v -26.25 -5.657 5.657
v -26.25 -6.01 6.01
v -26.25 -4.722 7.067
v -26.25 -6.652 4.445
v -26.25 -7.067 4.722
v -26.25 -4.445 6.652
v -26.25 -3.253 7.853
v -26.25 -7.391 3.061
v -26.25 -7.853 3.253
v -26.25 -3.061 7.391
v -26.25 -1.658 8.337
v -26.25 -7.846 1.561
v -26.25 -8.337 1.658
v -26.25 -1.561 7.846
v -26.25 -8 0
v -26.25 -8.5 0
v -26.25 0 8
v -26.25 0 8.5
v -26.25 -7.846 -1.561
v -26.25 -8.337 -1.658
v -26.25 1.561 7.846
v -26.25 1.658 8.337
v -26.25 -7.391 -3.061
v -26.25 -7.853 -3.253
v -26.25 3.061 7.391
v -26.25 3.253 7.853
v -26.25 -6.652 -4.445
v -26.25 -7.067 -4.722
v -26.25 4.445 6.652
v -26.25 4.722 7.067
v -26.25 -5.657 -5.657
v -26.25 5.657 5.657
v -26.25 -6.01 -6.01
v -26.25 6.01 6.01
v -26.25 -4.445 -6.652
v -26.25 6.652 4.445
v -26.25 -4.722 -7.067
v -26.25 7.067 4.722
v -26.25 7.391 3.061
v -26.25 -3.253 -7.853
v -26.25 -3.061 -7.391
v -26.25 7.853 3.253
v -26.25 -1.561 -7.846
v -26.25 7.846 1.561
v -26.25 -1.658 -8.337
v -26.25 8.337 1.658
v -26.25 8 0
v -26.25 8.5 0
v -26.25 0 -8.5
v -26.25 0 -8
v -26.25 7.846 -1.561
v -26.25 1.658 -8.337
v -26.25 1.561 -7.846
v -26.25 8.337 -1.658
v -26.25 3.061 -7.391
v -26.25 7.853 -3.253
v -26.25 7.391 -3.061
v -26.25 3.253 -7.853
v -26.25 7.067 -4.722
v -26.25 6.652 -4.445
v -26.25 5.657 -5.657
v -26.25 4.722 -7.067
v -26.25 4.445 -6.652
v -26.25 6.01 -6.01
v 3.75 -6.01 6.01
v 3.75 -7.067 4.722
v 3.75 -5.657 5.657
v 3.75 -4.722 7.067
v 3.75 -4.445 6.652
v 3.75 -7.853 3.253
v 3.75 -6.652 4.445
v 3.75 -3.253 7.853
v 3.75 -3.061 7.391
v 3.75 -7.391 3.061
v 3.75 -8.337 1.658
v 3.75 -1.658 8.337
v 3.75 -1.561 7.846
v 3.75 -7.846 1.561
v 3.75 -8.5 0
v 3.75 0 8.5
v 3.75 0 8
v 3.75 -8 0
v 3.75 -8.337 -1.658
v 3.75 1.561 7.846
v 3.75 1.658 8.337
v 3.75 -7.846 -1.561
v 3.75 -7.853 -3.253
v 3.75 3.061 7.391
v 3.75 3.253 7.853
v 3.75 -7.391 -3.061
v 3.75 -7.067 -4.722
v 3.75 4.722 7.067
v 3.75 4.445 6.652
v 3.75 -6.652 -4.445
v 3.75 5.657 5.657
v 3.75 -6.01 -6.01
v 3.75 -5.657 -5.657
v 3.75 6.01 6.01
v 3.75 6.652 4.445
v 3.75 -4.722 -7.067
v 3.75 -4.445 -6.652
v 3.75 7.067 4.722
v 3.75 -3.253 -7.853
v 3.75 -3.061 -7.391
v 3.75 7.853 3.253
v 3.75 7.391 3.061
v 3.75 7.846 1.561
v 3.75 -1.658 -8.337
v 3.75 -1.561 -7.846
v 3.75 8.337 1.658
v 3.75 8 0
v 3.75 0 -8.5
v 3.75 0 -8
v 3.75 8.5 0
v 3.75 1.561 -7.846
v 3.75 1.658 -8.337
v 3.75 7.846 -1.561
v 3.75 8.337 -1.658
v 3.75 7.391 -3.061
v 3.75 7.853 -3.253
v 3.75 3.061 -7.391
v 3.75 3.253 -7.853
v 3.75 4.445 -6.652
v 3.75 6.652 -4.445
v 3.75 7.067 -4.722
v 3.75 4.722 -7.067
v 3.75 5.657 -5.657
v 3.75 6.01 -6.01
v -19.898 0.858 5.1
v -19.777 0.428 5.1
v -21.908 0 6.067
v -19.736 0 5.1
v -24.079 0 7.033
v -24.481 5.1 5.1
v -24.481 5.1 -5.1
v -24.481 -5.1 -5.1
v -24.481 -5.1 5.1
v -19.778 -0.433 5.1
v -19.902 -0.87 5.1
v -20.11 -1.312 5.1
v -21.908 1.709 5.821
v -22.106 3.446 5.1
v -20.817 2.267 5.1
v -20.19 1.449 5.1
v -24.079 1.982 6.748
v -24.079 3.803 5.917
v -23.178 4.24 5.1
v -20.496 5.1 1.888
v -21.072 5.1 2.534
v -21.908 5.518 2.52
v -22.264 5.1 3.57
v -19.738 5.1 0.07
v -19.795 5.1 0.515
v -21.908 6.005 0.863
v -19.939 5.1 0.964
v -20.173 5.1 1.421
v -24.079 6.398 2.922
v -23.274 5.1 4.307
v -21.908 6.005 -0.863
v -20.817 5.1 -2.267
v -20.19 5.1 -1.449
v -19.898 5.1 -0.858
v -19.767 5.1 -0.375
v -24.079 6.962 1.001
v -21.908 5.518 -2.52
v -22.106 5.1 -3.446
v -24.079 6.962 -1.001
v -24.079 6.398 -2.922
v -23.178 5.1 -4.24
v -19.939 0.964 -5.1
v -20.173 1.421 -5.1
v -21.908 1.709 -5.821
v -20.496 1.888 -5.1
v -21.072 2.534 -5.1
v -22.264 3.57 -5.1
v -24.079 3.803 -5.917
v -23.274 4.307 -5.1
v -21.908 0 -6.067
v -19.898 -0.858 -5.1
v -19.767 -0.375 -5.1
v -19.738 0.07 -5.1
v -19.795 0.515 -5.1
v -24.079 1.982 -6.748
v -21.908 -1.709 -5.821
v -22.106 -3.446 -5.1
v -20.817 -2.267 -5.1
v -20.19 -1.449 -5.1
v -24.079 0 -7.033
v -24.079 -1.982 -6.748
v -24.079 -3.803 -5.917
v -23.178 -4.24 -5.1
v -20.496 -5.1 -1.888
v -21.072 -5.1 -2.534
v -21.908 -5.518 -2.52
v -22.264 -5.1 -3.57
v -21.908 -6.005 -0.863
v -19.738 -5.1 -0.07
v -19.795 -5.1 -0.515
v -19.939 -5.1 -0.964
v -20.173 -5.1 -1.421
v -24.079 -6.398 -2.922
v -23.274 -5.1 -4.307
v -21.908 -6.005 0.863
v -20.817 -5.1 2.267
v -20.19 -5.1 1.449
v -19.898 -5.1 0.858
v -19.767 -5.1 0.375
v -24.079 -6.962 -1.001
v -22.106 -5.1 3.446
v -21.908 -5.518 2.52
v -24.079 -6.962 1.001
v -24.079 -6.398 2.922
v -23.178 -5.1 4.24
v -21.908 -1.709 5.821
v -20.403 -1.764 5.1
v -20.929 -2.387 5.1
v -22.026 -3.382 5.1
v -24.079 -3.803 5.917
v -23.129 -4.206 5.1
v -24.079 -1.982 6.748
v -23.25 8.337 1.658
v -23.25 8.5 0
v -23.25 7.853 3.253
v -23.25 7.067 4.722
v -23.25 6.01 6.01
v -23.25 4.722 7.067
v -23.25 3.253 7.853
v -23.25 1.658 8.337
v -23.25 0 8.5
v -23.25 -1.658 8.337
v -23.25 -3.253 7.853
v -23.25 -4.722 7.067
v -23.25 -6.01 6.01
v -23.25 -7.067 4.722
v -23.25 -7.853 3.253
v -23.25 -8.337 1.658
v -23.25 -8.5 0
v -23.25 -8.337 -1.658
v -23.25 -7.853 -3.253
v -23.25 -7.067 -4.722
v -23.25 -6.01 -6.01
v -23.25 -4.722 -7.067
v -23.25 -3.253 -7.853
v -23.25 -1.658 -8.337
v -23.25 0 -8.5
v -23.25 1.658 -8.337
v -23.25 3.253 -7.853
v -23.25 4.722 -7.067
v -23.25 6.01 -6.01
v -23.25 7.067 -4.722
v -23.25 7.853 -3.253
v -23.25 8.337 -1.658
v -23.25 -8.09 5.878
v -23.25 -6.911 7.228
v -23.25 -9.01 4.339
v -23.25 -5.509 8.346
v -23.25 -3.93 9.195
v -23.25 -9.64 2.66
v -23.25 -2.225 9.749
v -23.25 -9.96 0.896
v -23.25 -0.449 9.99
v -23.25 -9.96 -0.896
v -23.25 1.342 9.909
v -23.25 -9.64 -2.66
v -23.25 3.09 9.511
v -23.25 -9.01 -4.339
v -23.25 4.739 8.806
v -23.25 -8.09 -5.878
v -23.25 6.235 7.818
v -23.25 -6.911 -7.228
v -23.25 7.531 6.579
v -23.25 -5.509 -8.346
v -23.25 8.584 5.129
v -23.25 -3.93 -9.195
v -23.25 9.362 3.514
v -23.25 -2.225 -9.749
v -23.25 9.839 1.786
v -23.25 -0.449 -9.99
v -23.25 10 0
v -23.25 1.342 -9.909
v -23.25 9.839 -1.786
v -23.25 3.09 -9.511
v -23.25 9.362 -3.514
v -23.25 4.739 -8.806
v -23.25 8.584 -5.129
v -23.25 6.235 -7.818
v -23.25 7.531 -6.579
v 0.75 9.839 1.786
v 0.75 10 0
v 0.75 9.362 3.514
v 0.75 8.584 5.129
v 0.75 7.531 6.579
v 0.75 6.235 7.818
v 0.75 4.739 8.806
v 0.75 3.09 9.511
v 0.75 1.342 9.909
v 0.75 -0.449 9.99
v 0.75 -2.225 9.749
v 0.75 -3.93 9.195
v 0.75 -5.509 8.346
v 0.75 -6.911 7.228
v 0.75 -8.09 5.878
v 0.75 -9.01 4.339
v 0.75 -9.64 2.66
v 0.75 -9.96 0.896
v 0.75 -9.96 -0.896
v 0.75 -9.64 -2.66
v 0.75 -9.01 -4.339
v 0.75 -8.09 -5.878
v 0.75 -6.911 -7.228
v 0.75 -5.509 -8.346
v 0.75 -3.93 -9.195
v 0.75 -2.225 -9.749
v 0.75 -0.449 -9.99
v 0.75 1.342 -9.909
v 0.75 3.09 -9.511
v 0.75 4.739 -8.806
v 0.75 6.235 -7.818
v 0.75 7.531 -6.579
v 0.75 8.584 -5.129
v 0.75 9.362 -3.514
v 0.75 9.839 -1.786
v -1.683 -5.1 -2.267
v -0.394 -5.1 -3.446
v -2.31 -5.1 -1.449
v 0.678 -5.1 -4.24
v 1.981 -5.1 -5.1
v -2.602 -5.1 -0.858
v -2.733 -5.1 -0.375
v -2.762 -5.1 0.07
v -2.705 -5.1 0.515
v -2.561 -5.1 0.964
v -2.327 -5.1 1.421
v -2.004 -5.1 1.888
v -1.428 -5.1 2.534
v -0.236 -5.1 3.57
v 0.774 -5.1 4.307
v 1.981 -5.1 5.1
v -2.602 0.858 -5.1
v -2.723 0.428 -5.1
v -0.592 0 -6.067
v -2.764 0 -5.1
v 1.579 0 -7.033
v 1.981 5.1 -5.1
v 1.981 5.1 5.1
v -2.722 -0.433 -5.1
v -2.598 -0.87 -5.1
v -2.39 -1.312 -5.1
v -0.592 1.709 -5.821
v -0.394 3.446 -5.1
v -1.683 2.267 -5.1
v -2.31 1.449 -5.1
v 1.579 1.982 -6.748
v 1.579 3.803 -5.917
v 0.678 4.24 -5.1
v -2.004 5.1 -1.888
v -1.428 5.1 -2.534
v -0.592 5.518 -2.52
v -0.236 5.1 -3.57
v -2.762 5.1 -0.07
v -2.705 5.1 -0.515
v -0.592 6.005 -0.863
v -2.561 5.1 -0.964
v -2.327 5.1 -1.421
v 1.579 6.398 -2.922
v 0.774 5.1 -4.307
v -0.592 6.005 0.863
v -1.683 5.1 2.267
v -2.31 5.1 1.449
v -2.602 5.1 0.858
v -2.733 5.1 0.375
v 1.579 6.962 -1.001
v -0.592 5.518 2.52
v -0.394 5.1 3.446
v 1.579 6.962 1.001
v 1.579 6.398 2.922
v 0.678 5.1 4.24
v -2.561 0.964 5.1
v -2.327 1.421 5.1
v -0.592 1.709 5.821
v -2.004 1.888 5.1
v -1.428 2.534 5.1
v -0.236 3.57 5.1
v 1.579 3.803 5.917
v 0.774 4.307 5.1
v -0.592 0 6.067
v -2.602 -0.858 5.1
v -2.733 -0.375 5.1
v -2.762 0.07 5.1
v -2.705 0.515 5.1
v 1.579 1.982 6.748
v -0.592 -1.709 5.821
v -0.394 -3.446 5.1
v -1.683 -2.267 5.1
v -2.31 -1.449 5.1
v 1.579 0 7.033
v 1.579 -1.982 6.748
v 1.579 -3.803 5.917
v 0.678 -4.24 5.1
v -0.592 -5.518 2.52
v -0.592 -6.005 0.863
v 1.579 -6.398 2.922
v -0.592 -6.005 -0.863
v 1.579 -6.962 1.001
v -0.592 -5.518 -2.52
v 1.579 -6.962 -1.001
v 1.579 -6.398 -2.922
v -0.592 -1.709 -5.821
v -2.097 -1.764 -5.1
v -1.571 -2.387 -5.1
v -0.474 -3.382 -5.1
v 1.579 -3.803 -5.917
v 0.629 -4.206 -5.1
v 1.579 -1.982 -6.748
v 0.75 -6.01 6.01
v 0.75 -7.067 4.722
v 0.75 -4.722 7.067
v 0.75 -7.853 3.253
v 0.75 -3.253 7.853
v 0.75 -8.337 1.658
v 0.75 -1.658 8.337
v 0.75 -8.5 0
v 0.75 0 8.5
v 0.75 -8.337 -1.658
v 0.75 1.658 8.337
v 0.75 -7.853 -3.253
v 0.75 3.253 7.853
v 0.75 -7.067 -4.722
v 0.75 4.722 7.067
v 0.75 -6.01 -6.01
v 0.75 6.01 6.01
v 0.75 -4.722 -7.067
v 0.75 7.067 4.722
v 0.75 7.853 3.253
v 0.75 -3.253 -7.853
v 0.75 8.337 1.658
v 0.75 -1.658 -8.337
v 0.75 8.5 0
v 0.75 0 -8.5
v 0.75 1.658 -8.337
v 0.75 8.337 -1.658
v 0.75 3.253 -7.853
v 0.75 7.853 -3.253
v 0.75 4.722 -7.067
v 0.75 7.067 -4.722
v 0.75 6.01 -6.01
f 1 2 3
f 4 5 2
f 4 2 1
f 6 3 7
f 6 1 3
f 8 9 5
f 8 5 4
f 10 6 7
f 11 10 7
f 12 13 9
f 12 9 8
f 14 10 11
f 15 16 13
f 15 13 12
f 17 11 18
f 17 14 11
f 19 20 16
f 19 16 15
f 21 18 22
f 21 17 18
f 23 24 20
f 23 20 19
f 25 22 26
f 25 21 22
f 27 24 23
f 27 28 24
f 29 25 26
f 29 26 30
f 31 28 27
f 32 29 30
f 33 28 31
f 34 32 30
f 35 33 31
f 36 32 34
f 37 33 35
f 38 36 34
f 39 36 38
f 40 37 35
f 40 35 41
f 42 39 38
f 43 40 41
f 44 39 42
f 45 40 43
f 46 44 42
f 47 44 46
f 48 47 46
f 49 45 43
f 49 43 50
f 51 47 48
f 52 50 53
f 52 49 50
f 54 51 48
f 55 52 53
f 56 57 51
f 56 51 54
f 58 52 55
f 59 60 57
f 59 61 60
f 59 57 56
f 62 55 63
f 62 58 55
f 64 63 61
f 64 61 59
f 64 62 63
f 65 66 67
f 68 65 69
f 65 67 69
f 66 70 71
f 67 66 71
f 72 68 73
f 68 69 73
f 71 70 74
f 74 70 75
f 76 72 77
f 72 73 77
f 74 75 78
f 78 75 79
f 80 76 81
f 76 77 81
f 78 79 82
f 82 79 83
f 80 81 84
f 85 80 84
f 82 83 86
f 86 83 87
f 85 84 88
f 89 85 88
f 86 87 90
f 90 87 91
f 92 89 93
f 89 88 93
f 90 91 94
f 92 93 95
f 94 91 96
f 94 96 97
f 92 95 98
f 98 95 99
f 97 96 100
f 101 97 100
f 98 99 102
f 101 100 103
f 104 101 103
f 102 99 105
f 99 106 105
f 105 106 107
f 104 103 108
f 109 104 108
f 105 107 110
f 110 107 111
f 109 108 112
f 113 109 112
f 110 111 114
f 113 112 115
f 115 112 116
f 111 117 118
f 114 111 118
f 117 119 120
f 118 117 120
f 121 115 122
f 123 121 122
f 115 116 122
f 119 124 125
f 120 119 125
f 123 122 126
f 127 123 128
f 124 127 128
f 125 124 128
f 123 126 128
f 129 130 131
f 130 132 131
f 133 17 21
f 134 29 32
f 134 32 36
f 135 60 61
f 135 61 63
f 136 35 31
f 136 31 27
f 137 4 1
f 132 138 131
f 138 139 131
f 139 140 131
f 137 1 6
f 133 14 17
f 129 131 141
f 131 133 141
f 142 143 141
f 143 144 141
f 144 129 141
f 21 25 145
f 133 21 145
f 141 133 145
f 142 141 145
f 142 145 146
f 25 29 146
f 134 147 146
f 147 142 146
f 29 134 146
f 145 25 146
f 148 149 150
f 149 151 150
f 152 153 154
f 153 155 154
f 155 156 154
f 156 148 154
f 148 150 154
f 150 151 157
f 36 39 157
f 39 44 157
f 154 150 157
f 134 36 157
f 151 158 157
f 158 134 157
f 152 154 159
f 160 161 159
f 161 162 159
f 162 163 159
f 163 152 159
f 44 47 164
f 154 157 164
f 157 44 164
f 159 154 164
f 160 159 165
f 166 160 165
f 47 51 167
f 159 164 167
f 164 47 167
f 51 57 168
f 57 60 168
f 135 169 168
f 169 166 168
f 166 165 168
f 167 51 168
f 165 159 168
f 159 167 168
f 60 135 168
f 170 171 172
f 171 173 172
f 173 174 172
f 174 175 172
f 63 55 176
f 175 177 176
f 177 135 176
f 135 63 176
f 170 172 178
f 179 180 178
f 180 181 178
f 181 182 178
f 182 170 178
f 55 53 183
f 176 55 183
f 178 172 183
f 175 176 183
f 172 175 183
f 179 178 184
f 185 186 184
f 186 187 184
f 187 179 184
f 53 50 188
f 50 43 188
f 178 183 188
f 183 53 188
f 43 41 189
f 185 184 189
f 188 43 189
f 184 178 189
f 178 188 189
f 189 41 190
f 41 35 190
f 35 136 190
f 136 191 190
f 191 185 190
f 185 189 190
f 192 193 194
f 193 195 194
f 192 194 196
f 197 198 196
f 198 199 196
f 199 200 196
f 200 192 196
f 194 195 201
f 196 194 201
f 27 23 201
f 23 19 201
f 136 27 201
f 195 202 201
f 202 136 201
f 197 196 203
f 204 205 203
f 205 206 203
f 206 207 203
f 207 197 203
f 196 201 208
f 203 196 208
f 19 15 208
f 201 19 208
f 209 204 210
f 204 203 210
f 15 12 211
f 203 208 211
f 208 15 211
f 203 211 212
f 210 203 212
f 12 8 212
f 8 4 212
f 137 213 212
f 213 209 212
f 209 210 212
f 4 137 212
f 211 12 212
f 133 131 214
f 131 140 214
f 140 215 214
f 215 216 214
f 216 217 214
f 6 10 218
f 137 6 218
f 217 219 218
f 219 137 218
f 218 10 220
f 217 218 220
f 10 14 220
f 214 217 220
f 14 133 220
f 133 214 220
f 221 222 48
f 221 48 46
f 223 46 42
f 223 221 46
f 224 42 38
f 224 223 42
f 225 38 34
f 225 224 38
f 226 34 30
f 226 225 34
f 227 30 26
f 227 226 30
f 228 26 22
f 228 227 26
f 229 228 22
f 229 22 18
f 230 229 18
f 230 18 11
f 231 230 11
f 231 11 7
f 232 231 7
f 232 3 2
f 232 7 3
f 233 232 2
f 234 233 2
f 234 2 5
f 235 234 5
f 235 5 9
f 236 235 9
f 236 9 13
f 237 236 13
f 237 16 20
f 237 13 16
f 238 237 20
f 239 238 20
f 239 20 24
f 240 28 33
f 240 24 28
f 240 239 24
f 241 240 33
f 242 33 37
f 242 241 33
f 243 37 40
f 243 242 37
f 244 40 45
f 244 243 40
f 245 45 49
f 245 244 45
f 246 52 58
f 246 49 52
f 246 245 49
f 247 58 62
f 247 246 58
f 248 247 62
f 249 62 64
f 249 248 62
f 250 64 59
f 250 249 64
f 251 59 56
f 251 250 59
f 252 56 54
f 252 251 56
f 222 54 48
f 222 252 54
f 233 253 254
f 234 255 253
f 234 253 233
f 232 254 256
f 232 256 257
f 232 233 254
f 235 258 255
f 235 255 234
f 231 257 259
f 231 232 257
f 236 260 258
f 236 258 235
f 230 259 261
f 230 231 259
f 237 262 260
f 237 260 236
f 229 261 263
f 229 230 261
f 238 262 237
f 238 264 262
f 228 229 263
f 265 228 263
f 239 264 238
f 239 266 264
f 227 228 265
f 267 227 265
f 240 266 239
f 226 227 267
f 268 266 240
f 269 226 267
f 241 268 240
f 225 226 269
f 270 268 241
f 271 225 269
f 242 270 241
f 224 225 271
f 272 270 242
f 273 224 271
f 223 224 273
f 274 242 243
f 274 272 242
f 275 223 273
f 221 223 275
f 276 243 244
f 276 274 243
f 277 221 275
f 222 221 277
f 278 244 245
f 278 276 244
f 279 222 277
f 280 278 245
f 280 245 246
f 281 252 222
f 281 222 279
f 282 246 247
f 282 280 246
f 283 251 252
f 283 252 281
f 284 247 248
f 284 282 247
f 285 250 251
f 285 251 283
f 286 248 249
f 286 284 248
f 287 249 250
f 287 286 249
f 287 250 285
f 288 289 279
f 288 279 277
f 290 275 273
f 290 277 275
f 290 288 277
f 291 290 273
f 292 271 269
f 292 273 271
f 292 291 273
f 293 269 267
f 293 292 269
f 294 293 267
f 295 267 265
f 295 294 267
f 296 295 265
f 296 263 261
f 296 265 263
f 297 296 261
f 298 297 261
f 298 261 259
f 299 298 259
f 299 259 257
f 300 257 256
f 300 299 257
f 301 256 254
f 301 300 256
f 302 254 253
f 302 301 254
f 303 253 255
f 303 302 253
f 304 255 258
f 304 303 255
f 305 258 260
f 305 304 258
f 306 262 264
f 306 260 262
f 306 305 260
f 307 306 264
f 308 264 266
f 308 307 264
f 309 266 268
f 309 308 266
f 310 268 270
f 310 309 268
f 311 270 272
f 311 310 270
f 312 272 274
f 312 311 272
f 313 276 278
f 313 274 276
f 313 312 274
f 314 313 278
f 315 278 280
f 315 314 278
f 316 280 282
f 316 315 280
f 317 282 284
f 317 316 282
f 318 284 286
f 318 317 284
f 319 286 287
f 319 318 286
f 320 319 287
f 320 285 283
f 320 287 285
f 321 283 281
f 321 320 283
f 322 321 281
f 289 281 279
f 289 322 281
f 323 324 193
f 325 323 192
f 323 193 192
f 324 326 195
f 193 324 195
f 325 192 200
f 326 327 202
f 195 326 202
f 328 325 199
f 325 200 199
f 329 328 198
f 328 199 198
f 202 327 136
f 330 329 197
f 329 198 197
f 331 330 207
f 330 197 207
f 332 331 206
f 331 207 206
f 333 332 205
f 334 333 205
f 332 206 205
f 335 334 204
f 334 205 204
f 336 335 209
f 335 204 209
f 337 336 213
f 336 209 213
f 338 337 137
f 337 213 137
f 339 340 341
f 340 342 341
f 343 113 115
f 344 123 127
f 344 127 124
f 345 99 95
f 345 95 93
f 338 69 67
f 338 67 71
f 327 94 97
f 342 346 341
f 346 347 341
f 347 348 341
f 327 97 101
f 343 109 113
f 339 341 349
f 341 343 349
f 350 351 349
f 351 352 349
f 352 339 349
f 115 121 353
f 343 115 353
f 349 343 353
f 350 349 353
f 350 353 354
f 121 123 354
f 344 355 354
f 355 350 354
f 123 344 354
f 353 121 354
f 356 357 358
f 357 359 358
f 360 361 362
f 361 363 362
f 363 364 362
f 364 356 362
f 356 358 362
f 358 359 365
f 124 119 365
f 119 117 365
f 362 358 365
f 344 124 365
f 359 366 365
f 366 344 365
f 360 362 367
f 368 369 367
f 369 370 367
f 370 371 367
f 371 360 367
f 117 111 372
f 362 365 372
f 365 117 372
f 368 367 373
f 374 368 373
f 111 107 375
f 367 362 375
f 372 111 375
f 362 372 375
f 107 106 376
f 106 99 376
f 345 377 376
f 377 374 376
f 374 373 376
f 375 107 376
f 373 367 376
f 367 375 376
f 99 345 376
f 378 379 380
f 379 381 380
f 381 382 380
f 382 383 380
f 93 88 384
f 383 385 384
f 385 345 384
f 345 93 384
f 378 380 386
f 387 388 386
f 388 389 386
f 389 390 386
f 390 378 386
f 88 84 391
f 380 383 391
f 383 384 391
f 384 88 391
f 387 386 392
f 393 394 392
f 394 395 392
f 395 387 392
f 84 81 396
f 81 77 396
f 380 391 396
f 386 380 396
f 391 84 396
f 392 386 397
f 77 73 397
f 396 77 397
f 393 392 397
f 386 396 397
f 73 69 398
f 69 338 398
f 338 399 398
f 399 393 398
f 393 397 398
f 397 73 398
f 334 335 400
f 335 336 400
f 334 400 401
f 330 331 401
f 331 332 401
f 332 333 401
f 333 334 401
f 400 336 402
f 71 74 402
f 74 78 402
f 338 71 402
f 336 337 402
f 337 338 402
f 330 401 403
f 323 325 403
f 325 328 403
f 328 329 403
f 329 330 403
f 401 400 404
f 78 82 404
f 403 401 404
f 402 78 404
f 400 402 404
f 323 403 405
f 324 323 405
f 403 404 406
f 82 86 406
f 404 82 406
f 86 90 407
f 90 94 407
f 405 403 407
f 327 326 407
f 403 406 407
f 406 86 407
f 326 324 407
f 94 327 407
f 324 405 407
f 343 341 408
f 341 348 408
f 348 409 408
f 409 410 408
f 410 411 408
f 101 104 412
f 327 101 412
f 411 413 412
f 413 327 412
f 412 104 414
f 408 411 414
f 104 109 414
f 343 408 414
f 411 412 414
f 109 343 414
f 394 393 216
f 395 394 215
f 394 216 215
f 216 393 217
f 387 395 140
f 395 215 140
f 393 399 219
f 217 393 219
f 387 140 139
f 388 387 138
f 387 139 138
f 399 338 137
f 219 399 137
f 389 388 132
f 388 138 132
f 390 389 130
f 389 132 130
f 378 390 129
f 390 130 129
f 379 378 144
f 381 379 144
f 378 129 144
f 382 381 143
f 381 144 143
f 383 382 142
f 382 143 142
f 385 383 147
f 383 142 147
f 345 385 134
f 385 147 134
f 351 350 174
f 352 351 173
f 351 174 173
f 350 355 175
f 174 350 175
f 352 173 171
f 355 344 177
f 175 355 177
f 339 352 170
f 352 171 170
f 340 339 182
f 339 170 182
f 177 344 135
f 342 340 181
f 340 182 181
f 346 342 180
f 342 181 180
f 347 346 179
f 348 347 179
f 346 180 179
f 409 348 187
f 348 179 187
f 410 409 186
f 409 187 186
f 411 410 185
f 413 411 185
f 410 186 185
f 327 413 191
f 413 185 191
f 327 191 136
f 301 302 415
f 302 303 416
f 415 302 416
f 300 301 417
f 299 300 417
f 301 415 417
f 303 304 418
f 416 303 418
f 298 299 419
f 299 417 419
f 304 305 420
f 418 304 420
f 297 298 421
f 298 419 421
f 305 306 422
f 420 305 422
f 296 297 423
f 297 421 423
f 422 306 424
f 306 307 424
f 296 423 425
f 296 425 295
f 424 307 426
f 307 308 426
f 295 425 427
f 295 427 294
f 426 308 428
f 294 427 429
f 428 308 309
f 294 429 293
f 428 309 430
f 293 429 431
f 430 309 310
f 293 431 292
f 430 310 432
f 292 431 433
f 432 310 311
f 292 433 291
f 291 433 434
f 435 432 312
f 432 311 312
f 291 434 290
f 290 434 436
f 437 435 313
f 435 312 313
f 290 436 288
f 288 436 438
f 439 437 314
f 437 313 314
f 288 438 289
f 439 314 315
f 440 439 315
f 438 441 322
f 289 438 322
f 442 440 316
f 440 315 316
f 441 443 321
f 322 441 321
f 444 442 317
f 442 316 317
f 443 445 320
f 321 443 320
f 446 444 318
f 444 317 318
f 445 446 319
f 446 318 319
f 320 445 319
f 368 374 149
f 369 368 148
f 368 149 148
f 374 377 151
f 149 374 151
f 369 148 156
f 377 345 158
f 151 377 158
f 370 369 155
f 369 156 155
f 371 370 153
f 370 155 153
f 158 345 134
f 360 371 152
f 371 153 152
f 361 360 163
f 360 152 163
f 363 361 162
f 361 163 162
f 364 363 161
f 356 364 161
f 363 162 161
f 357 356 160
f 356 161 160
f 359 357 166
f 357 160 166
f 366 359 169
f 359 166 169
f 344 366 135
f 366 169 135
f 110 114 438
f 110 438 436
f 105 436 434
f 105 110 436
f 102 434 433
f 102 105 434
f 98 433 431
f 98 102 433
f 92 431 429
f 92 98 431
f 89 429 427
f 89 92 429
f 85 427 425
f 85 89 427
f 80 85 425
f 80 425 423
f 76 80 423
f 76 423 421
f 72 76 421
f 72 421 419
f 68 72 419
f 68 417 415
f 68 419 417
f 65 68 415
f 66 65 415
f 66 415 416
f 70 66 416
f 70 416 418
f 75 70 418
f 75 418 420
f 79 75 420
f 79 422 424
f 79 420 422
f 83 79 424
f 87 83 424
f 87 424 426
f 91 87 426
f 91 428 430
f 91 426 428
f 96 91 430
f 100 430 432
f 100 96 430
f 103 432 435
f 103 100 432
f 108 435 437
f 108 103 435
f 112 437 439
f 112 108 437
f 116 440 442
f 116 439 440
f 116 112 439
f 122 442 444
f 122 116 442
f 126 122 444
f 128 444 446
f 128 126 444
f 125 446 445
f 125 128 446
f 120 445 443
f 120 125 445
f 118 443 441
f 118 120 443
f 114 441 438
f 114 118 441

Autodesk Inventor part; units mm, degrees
ref_plane "YZ Plane" through (0, 0, 0) normal (1, 0, 0) x (0, 1, 0)
ref_plane "XZ Plane" through (0, 0, 0) normal (0, 1, 0) x (-1, 0, 0)
sketch "Szkic1" plane through (0, 0, 0) normal (0, 0, 1) x (1, 0, 0)
  point P0 (0, 0)
sketch "Szkic2" plane through (0, 0, 0) normal (0, 0, 1) x (1, 0, 0)
  line L0 (-26.25, 0) -> (-26.25, 8.5)
  line L1 (-26.25, 8.5) -> (-23.25, 8.5)
  line L2 (-23.25, 8.5) -> (-23.25, 10)
  line L3 (-23.25, 10) -> (0.75, 10)
  line L4 (0.75, 10) -> (0.75, 8.5)
  line L5 (0.75, 8.5) -> (3.75, 8.5)
  line L6 (3.75, 8.5) -> (3.75, 0)
  line L7 (3.75, 0) -> (-26.25, 0)
  point P0 (0, 0)
  dimension "d0" = 30
  dimension "d2" = 3
  dimension "d3" = 24
  dimension "d4" = 20
  dimension "d5" = 17
revolve "Obrót1" add sketch "Szkic2" angle 360 about axis through (3.75, 0, 0) along (-1, 0, 0)
sketch "Szkic3" plane through (3.75, 0, 0) normal (1, 0, 0) x (0, 0, -1)
  circle A0 centre (0, 0) radius 8
  dimension "d7" = 16
extrude "Wyciągnięcie proste1" cut sketch "Szkic3" against normal blind 10 draft -24
sketch "Szkic4" plane through (-26.25, 0, 0) normal (-1, 0, 0) x (0, 0, 1)
  line L0 (-5.1, -5.1) -> (5.1, -5.1)
  line L1 (5.1, -5.1) -> (5.1, 5.1)
  line L2 (5.1, 5.1) -> (-5.1, 5.1)
  line L3 (-5.1, 5.1) -> (-5.1, -5.1)
  line L4 (-5.1, -5.1) -> (5.1, 5.1) construction
  line L5 (5.1, -5.1) -> (-5.1, 5.1) construction
  point P0 (0, 0)
  dimension "d10" = 10.2
  dimension "d11" = 10.2
extrude "Wyciągnięcie proste2" cut sketch "Szkic4" against normal through all
sketch "Szkic5" plane through (-26.25, 0, 0) normal (-1, 0, 0) x (0, 0, 1)
  circle A0 centre (0, 0) radius 8
  dimension "d14" = 16
extrude "Wyciągnięcie proste3" cut sketch "Szkic5" against normal blind 10 draft -24
sketch "Szkic6" plane through (0, 0, 0) normal (0, 0, 1) x (1, 0, 0)
  point P0 (0, 0)
properties part number "Bartosz_Zukowski_model_nr_13"
